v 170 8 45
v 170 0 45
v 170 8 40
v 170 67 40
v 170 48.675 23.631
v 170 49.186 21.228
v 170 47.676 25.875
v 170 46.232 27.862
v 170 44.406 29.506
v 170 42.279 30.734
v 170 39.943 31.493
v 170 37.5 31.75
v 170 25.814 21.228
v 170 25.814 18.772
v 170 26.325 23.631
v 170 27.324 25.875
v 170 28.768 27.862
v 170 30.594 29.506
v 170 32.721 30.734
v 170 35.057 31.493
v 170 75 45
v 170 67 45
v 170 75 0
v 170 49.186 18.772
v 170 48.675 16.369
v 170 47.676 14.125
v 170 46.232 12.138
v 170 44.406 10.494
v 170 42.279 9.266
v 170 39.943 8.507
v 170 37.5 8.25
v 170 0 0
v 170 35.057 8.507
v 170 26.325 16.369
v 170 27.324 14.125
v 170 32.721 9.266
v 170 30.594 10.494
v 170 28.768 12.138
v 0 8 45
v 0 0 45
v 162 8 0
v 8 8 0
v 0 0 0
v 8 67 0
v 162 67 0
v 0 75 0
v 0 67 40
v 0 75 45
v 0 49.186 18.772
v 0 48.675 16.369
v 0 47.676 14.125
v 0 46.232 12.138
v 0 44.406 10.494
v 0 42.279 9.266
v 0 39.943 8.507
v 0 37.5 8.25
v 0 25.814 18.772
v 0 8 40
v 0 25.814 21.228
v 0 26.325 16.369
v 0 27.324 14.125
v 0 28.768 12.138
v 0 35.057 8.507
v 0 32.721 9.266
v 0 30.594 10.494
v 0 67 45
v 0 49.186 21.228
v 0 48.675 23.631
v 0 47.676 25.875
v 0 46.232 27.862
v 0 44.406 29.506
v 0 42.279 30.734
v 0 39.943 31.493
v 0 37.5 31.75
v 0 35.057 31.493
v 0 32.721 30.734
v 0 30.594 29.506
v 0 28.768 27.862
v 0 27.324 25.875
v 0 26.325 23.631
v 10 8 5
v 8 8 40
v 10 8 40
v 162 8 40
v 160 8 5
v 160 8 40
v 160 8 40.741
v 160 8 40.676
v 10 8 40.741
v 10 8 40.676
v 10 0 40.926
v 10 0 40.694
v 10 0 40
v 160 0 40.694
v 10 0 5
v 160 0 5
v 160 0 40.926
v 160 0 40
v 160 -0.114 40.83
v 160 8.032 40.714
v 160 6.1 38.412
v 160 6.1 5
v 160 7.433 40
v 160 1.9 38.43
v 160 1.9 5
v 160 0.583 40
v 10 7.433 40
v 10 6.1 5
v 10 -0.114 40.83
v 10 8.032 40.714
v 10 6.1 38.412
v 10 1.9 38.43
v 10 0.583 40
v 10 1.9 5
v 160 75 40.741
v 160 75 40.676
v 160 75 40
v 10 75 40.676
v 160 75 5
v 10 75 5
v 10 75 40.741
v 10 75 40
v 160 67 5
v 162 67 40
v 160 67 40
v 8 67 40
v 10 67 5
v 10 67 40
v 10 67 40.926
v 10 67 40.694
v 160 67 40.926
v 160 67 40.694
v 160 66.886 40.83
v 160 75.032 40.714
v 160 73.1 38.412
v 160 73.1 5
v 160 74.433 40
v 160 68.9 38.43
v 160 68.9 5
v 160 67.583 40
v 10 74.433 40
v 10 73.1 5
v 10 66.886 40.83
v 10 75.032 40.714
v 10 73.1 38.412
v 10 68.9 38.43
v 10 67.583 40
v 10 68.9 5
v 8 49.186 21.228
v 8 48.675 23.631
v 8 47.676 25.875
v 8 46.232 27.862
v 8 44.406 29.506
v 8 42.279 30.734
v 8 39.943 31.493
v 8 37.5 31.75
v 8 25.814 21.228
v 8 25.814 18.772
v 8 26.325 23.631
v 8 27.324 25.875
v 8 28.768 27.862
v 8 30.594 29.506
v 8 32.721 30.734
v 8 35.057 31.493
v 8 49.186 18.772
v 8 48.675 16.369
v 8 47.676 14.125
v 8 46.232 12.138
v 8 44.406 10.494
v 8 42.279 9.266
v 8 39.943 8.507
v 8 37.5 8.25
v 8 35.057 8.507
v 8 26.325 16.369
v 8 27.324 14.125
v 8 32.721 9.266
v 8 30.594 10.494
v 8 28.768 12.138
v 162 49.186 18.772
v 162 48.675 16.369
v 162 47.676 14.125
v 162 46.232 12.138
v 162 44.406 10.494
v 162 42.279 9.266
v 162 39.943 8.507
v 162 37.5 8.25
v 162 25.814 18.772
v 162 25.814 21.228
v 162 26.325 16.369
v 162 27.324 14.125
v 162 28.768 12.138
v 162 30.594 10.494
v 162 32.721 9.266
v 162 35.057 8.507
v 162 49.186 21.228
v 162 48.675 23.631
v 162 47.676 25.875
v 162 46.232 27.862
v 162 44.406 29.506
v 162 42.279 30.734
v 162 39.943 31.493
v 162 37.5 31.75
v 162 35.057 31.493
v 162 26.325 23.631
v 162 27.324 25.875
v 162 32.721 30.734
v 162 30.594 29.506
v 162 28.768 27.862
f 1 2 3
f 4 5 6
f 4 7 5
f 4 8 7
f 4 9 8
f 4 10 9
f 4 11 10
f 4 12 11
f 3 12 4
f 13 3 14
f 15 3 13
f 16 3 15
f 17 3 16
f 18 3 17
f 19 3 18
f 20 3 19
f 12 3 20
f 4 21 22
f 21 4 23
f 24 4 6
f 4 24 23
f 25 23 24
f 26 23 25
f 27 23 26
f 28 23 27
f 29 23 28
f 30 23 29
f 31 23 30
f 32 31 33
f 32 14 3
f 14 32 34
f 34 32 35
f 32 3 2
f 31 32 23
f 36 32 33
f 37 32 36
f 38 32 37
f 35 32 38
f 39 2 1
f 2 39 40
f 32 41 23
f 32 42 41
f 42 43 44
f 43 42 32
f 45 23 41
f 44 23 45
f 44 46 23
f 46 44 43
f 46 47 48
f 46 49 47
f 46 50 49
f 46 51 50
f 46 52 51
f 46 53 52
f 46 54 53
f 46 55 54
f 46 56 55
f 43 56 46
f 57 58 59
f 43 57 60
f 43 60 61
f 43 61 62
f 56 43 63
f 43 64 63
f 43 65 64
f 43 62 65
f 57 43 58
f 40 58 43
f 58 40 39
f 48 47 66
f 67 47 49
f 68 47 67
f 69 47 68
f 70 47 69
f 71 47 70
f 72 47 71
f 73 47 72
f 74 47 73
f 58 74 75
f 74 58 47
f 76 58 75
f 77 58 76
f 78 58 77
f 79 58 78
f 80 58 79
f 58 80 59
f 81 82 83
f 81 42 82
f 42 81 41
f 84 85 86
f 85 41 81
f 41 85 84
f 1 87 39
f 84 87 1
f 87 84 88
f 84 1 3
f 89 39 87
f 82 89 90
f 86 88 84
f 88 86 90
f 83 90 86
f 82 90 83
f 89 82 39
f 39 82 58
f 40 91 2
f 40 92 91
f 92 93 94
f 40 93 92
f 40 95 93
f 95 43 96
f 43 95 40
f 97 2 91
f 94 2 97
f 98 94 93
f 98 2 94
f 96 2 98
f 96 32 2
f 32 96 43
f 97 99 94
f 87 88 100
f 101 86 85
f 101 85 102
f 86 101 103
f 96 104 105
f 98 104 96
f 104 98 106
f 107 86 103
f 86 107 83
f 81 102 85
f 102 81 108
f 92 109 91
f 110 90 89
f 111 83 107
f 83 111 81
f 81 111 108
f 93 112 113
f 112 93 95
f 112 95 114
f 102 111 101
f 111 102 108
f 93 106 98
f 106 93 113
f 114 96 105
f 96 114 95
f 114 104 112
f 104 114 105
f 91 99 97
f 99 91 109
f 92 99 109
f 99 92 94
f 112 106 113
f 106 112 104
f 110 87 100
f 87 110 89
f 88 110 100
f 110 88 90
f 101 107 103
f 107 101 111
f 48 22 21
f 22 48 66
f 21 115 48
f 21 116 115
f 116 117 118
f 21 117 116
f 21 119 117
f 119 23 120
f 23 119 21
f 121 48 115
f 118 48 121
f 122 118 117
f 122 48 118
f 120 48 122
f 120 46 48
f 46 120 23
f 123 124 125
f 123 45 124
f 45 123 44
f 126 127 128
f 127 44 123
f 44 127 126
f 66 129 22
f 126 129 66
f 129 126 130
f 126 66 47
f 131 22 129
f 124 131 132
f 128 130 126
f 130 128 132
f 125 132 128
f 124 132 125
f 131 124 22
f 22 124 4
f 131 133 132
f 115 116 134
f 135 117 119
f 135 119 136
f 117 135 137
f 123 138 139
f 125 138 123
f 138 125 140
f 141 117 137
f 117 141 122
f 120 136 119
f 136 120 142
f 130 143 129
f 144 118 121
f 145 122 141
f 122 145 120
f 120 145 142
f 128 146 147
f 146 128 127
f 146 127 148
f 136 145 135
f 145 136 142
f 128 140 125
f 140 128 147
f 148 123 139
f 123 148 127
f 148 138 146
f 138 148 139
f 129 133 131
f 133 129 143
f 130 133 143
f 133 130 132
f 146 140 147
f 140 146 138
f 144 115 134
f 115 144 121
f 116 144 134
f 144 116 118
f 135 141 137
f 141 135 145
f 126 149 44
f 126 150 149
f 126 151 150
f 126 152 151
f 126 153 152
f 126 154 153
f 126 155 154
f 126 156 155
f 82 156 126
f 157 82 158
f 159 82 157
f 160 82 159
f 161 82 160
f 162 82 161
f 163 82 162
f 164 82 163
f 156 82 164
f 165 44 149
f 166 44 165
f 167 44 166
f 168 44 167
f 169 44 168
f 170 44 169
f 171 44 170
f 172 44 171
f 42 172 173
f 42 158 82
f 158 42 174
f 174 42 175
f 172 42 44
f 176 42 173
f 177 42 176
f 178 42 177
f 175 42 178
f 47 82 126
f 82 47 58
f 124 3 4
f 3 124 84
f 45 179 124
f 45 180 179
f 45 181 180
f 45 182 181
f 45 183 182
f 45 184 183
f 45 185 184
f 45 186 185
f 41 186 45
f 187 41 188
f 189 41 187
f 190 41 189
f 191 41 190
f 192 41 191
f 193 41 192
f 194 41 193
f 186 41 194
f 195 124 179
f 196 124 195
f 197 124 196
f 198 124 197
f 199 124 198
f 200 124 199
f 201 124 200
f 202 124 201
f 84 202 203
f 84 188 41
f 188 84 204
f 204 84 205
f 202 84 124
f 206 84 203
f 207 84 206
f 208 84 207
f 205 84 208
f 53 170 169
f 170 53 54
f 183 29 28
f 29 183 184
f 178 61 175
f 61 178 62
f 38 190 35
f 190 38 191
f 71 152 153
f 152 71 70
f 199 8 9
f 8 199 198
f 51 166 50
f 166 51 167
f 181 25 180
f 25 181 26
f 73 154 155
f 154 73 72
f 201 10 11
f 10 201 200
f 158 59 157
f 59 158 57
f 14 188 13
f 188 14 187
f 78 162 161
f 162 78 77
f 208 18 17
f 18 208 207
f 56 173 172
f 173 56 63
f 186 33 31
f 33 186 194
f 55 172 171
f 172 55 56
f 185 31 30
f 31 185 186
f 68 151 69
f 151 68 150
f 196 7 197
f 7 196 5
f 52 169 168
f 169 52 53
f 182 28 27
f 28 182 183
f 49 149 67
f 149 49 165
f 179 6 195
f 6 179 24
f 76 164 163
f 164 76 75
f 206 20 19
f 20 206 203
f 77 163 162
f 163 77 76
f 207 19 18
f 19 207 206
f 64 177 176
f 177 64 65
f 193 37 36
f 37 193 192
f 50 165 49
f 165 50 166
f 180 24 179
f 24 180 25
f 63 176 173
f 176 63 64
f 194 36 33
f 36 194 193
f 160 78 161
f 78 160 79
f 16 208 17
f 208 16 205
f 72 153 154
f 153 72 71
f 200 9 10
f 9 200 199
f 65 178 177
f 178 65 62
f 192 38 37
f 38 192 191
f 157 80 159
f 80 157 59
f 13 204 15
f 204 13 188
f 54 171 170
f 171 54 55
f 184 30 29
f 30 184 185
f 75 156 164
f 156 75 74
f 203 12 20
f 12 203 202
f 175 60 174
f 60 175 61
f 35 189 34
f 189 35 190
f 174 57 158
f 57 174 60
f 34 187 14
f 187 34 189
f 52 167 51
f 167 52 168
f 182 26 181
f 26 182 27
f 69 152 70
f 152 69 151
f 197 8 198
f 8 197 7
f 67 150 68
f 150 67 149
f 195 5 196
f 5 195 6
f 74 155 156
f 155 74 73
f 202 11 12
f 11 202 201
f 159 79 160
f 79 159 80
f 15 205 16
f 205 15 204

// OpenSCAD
shaft_radius = 11;
shaft_tolerance = 0.75;
cage_height = 40;
cage_width = 75;
cage_length = 170;
block_thickness = 8;

module fixup_fillet()
{
	rotate(v = [1, 0, 0], a = 40)
		cube(size = [cage_length - 20, block_thickness - 6, 5]);
}

module cage_side()
{
	union() {
	difference() {
		cube(size = [cage_length, block_thickness, cage_height + 5]);
		translate(v = [10, 6.1, 5])
			cube(size = [cage_length - 20, block_thickness - 6, cage_height + 5 - 10]);
		translate(v = [10, -0.1, 5])
			cube(size = [cage_length - 20, block_thickness - 6, cage_height + 5 - 10]);
	}
	translate(v = [10, 3.1, cage_height - 3])
		fixup_fillet();
	translate(v = [10, 6.5, cage_height - 3 + 5]) 
		mirror(v = [0, 0, 1])
			fixup_fillet();
	}
}

module cage_end_basic()
{
	cube(size = [block_thickness, cage_width, cage_height]);
}

module yoke_cage_basic()
{
	cage_side();
	cage_end_basic();
	translate(v = [0, cage_width - block_thickness, 0])
		cage_side();
	translate(v = [cage_length - block_thickness, 0])
		cage_end_basic();
}

module yoke_cage()
{
	difference() {
		yoke_cage_basic();
		translate(v = [-cage_length / 4, cage_width / 2, cage_height / 2])
			rotate(v = [0, 1, 0], a = 90)
				cylinder(r1 = shaft_radius + shaft_tolerance, r2 = shaft_radius + shaft_tolerance, h = 1.5 * cage_length);
	}
}

yoke_cage();
